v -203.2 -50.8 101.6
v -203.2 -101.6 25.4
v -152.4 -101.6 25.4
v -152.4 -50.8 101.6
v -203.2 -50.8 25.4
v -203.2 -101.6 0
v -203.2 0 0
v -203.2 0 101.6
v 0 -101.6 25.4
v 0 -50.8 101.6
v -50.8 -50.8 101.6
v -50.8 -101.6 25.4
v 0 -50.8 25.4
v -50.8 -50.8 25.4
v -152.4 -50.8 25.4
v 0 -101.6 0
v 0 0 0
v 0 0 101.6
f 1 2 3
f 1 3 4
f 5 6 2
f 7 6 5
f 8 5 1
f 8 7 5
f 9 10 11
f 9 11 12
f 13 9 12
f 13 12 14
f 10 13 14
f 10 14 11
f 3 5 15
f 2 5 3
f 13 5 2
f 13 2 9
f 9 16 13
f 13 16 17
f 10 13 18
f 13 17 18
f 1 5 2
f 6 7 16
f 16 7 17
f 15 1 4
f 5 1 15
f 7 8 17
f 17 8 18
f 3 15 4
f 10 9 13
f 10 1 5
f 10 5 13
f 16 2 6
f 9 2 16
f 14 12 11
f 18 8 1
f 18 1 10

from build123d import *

# Parameters (mm, degrees)
F0_W     = 203.2
F0_H     = 101.6
F1_DEPTH = 50.8
F2_W     = 203.2
F2_H     = 25.4
F3_DEPTH = 50.8
F5_DEPTH = 50.8
F7_DEPTH = 50.8


# Not quite as in the source:
# - a feature names something its author has since deleted; it is built from what else it names


with BuildPart() as f1:
    # F0 (on Front) → F1 (new body)
    with BuildSketch(Plane.XZ):
        with Locations((-101.6, 50.8)):
            Rectangle(F0_W, F0_H)
    extrude(amount=F1_DEPTH)

    # F2 (on face) → F3 (join)
    with BuildSketch(Plane.XZ.offset(50.8)):
        with Locations((-101.6, 12.7)):
            Rectangle(F2_W, F2_H)
    extrude(amount=F3_DEPTH)


with BuildPart() as f5:
    # F4 (on face) → F5 (new body)
    with BuildSketch(Plane(origin=(-203.2, 0, 0), x_dir=(0, -1, 0), z_dir=(-1, 0, 0))):
        Polygon((101.6, 25.4), (50.8, 101.6), (50.8, 25.4), align=None)
    extrude(amount=-F5_DEPTH)


with BuildPart() as f7:
    # F6 (on face) → F7 (new body)
    with BuildSketch(Plane.YZ):
        Polygon((-50.8, 25.4), (-50.8, 101.6), (-101.6, 25.4), align=None)
    extrude(amount=-F7_DEPTH)


solid = Compound([f1.part, f5.part, f7.part])
